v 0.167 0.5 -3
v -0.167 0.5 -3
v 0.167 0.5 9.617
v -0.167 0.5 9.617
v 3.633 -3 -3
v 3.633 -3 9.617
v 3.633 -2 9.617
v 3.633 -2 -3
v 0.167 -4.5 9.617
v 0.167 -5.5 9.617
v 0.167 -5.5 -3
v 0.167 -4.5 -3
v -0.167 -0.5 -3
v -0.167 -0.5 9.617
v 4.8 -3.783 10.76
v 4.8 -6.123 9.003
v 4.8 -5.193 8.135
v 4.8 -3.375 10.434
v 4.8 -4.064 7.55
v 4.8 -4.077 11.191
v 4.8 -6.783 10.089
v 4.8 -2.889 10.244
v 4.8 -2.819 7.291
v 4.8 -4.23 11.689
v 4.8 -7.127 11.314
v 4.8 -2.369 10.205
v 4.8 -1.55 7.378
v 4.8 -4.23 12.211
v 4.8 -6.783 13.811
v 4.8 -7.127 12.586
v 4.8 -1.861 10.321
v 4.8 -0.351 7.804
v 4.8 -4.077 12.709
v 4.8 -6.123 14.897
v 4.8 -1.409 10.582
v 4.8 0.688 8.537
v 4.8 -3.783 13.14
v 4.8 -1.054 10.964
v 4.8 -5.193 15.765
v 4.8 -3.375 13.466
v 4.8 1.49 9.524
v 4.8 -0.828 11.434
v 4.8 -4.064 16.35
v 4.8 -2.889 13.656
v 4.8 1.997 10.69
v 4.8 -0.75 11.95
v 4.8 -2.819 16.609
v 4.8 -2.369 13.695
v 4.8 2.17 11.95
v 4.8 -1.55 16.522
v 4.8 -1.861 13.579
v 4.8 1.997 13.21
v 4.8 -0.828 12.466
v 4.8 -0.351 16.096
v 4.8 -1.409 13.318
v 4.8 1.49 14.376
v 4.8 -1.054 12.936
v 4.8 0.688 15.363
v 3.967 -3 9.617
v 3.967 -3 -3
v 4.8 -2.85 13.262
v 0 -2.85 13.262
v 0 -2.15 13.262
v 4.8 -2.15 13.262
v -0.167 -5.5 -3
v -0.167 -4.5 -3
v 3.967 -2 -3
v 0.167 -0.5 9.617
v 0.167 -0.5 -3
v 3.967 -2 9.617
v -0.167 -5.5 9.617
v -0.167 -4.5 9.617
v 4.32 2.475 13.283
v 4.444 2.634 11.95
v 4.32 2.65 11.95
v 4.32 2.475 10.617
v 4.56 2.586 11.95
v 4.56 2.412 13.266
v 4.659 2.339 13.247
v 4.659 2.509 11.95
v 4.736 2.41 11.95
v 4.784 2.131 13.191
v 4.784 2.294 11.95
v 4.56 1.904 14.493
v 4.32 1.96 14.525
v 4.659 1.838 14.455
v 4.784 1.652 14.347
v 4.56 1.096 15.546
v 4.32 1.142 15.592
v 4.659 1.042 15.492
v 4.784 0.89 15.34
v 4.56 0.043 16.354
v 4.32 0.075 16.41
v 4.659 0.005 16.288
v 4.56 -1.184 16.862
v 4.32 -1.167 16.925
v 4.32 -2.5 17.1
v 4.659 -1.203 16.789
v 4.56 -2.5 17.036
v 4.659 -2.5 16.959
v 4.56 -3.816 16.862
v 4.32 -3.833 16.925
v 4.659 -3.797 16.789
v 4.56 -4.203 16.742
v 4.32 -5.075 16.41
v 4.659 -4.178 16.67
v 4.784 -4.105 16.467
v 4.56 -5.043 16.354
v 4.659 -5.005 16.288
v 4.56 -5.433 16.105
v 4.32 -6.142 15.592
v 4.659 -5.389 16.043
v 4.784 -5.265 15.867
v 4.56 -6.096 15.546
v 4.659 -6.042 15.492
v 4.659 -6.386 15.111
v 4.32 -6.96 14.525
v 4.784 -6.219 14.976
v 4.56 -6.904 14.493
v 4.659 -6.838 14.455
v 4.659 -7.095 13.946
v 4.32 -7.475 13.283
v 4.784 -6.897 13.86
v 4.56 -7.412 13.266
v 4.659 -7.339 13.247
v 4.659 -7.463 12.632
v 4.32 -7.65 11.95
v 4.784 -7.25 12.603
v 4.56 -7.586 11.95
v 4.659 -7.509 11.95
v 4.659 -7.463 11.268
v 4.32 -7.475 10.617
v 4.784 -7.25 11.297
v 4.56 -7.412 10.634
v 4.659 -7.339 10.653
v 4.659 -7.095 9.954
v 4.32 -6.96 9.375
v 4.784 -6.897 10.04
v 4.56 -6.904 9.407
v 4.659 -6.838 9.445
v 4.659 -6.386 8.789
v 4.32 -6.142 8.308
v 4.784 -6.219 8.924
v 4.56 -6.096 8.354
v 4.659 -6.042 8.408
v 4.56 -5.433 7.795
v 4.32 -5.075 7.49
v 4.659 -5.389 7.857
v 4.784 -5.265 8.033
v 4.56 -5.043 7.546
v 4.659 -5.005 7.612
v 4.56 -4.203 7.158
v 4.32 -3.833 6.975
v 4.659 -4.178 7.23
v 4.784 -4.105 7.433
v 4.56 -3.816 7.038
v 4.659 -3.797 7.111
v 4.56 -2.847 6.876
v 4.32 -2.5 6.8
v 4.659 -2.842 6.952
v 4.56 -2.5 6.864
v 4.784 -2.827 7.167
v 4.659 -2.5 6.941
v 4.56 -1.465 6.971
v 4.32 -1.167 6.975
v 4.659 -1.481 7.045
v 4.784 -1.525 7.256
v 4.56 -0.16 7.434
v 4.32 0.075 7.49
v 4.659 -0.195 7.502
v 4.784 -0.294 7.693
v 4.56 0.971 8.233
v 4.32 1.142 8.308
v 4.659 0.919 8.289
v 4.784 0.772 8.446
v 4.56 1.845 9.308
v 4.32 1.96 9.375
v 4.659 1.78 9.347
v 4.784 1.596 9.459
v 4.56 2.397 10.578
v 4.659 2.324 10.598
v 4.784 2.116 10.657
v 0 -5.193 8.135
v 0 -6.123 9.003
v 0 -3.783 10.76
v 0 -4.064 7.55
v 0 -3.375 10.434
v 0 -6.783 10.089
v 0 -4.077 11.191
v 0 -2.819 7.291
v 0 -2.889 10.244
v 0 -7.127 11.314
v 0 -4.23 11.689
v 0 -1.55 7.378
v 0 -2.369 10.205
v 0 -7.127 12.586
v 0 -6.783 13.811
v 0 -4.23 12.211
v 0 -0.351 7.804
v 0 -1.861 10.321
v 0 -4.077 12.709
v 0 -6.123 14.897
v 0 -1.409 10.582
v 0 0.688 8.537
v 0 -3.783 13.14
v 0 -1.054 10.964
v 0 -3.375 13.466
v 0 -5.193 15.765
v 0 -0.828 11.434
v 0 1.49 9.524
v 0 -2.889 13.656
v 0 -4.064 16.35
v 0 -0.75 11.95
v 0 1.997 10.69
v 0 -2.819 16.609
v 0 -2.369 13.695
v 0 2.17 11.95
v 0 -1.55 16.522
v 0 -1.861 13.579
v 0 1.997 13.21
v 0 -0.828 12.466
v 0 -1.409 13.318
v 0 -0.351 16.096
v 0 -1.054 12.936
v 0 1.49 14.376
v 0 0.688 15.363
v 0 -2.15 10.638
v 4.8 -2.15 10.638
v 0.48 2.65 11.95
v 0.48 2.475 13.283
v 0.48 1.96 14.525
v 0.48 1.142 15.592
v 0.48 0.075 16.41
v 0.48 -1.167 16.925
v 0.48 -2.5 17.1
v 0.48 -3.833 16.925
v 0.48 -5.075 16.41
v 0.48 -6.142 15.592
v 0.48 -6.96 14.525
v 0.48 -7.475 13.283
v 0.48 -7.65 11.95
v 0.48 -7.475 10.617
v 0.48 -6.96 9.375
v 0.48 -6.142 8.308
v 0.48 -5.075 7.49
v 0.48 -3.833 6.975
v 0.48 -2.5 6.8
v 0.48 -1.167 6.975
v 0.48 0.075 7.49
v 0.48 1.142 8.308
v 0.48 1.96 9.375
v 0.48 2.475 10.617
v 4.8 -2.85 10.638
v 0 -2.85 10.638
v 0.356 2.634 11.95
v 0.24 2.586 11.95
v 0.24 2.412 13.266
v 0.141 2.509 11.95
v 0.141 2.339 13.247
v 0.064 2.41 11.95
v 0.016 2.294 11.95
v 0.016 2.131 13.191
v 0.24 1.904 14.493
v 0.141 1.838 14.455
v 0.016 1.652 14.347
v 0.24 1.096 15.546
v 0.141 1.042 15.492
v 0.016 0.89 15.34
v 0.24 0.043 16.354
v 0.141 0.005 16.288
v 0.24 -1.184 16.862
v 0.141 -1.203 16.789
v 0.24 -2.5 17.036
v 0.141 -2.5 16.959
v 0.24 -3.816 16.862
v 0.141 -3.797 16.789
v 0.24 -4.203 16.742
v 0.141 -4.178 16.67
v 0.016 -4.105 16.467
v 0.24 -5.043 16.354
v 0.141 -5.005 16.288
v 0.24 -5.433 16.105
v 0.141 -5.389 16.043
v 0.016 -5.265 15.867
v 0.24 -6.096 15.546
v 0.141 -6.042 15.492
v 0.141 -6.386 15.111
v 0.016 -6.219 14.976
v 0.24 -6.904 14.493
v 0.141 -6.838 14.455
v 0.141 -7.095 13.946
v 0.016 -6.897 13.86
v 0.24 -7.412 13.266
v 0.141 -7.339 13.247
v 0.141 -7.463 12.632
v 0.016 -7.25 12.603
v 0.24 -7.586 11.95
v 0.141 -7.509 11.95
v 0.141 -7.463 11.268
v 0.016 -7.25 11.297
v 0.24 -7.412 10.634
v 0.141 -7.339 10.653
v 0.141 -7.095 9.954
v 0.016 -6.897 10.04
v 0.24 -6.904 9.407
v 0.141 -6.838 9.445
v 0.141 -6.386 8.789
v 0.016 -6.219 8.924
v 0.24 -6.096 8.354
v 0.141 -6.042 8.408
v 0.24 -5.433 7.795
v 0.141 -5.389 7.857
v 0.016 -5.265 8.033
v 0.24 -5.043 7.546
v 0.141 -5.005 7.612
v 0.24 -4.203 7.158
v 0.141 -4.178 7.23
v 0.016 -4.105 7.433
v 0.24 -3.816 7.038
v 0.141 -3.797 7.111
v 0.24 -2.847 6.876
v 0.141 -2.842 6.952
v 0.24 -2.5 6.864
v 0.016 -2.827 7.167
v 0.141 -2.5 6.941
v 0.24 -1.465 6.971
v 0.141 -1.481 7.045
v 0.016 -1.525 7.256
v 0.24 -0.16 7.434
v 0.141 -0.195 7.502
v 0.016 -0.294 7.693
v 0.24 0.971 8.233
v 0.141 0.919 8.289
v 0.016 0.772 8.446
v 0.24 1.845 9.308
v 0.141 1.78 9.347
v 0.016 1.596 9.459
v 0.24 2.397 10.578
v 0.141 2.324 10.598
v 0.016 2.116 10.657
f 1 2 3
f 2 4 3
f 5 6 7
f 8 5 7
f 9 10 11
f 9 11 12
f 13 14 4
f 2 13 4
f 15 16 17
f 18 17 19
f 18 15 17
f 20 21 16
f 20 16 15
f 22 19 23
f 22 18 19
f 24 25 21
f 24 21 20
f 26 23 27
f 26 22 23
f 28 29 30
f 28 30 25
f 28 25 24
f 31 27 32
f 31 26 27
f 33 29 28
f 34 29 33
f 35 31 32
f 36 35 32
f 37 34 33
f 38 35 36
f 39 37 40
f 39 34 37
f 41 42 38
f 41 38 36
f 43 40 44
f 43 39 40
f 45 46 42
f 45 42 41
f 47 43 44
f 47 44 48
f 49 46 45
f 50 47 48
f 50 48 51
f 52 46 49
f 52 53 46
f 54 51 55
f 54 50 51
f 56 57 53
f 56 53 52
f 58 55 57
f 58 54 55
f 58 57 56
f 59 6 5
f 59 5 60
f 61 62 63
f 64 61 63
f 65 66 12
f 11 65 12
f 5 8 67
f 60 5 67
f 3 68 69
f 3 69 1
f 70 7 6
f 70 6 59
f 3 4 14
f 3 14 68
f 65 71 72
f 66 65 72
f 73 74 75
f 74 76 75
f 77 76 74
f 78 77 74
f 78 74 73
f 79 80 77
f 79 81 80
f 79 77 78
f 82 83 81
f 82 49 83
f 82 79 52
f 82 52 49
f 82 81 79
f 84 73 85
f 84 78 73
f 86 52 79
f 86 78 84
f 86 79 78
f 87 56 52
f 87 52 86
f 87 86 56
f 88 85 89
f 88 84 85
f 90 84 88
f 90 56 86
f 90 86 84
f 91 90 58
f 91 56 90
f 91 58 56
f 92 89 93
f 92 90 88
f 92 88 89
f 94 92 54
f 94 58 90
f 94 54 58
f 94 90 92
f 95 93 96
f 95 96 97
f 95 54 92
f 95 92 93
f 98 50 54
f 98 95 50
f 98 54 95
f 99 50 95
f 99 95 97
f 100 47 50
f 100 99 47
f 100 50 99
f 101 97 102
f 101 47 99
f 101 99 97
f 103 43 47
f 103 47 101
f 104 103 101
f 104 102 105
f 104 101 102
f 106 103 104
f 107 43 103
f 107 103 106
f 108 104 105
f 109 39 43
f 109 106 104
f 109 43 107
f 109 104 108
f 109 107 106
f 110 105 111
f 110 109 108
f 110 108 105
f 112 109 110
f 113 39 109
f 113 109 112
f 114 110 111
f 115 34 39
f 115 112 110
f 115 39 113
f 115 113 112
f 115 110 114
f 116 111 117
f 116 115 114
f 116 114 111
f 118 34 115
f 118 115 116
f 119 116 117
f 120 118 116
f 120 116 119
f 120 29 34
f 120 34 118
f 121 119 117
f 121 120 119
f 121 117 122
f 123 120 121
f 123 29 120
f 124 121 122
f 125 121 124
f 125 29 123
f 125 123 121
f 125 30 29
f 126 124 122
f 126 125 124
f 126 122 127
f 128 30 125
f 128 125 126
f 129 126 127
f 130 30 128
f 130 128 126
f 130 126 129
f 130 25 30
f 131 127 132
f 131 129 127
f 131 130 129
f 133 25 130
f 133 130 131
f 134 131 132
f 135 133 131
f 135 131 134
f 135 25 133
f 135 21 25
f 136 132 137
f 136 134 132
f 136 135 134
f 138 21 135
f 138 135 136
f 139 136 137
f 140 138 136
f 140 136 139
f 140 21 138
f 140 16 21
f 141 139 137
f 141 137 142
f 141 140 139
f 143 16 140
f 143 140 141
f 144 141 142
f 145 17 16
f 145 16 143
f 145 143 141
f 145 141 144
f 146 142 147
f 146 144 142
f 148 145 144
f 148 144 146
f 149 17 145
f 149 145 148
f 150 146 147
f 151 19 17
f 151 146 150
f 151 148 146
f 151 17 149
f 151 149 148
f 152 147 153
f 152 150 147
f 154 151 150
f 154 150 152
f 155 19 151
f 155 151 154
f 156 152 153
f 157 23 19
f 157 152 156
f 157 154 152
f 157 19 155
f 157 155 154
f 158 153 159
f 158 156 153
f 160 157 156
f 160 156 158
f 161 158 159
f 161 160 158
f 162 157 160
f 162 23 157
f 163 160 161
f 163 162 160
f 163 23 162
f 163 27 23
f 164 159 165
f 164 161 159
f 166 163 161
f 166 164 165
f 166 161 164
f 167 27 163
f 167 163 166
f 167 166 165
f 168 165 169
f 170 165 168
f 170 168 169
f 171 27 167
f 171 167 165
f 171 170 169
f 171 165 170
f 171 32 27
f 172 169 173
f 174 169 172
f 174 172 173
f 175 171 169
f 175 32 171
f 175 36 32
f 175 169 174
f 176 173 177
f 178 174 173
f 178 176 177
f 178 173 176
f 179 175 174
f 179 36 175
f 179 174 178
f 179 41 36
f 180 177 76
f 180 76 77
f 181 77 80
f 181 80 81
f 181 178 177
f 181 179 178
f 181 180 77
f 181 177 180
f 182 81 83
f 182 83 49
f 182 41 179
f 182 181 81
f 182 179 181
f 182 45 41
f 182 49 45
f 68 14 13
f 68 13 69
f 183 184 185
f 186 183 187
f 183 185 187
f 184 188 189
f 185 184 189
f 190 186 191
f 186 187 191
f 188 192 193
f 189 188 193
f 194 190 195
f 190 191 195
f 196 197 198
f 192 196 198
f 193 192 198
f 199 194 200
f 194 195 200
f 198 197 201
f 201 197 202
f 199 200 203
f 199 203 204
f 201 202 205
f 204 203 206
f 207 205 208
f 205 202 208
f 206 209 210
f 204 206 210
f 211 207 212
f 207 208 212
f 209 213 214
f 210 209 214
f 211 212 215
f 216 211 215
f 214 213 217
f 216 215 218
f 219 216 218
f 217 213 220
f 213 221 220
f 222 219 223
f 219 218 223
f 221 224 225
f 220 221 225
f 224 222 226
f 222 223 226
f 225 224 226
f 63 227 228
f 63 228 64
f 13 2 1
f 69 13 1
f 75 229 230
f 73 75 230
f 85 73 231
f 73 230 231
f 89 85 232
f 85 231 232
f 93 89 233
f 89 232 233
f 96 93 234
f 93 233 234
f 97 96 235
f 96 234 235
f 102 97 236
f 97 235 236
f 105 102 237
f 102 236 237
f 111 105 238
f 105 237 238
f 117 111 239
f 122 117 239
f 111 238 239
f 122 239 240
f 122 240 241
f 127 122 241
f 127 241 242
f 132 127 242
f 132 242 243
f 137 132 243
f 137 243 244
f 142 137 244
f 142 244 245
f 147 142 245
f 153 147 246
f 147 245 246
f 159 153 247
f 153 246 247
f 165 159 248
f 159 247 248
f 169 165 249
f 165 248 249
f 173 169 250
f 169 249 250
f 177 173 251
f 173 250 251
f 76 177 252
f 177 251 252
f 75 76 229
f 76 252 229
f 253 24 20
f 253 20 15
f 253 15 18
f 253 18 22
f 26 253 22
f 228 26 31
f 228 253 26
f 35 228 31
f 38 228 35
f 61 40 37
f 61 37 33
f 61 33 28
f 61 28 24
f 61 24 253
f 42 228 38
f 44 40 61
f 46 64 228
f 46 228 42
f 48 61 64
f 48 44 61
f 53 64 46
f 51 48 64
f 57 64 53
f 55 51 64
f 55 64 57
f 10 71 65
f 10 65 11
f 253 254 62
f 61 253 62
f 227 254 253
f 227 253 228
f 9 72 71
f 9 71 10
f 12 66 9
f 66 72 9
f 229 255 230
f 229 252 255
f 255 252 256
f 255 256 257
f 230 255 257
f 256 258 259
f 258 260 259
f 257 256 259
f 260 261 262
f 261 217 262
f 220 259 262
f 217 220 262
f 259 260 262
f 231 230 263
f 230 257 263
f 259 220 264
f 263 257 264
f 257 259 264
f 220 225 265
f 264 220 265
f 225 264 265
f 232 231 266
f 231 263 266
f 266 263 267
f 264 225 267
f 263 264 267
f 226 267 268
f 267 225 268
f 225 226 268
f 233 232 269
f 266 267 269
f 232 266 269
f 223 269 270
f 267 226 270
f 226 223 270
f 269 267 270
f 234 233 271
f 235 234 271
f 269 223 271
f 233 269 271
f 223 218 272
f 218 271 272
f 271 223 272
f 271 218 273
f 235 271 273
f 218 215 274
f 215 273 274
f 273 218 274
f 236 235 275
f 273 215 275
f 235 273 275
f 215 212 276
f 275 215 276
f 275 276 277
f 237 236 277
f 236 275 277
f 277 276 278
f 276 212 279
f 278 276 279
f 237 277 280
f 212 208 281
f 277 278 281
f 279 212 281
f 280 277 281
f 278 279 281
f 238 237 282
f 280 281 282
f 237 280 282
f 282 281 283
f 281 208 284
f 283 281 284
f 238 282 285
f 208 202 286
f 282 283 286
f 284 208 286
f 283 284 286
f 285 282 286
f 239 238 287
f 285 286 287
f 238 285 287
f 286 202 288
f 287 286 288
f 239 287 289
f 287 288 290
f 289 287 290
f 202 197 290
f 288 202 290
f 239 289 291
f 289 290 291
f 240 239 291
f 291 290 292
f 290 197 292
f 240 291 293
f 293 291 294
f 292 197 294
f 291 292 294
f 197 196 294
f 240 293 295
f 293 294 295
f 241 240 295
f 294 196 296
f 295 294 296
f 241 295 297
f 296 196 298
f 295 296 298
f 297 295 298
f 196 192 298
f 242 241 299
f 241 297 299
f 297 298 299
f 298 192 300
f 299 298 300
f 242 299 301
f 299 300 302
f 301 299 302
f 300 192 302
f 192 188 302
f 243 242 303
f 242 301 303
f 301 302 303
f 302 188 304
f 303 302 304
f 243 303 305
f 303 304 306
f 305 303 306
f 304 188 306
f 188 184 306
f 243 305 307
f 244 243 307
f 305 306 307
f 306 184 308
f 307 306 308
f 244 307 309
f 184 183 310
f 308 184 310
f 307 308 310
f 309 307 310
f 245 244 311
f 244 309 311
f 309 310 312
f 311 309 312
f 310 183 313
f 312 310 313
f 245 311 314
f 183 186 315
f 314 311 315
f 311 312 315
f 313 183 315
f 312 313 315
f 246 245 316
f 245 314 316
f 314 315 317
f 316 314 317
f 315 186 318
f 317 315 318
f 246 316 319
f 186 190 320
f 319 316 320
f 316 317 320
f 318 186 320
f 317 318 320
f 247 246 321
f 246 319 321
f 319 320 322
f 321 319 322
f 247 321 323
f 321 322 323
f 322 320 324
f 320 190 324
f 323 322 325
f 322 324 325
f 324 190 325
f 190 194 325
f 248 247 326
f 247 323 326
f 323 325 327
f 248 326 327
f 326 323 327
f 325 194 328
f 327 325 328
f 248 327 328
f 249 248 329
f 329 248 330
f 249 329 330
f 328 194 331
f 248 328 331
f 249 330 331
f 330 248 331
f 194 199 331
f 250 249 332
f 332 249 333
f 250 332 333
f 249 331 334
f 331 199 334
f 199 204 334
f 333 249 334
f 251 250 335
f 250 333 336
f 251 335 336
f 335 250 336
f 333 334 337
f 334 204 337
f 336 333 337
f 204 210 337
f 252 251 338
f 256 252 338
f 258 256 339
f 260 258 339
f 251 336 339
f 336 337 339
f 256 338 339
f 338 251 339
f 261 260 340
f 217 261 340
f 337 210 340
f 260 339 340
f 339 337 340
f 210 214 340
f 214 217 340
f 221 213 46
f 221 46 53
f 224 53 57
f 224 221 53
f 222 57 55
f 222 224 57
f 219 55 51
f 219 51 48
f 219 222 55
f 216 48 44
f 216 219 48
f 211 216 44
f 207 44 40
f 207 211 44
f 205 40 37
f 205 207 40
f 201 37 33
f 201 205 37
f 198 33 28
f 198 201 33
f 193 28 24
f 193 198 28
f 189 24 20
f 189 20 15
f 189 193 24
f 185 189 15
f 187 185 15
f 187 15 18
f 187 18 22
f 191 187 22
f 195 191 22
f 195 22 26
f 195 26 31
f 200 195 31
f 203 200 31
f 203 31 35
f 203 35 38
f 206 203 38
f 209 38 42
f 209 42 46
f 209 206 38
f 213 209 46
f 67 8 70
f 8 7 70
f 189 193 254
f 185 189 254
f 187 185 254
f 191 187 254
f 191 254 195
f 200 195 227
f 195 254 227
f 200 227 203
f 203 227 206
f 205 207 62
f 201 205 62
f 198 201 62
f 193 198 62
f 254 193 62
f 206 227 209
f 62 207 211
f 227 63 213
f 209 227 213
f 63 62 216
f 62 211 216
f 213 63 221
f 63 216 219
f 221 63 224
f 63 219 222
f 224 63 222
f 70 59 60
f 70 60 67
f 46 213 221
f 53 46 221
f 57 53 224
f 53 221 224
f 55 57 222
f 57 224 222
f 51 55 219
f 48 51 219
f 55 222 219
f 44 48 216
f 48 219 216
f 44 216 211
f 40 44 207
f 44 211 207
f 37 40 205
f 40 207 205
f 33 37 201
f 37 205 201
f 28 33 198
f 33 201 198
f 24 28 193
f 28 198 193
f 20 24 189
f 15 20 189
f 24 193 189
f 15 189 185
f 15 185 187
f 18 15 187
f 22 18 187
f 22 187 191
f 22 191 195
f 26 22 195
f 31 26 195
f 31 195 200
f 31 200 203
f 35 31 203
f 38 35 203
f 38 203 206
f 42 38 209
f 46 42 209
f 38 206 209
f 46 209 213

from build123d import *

# Parameters (mm, degrees)
SKETCH001_R       = 1.75
SKETCH001_W       = 0.7
SKETCH001_H       = 2.625
PAD001_DEPTH      = 4.8
SKETCH_R          = 5.15
SKETCH_R_2        = 1.75
PAD_DEPTH         = 4.8
FILLET_R          = 0.48
SKETCH003_W       = 0.333334
SKETCH003_H       = 1
PAD002_DEPTH      = 9.616667
PAD002_DEPTH_BACK = 3


with BuildPart() as pad001:
    # Sketch001 → Pad001 (new body)
    with BuildSketch(Plane.YZ):
        with Locations((-2.5, 11.95)):
            Circle(SKETCH001_R)
        with Locations((-2.5, 11.95)):
            Rectangle(SKETCH001_W, SKETCH001_H, mode=Mode.SUBTRACT)
    extrude(amount=PAD001_DEPTH)


with BuildPart() as fillet_body:
    # Sketch → Pad (new body)
    with BuildSketch(Plane.YZ):
        with Locations((-2.5, 11.95)):
            Circle(SKETCH_R)
        with Locations((-2.5, 11.95)):
            Circle(SKETCH_R_2, mode=Mode.SUBTRACT)
    extrude(amount=PAD_DEPTH)

    # Fillet
    fillet_edges = [fillet_body.edges().sort_by_distance(p)[0] for p in [
        (0, -7.65, 11.95),
        (4.8, -7.65, 11.95),
    ]]
    fillet(fillet_edges, radius=FILLET_R)


with BuildPart() as pad002:
    # Sketch003 → Pad002 (new body, two sides)
    with BuildSketch(Plane.XY) as pad002_sk:
        Rectangle(SKETCH003_W, SKETCH003_H)
        with Locations((3.8, -2.5)):
            Rectangle(SKETCH003_W, SKETCH003_H)
        with Locations((0, -5)):
            Rectangle(SKETCH003_W, SKETCH003_H)
    extrude(amount=PAD002_DEPTH)
    extrude(pad002_sk.sketch, amount=-PAD002_DEPTH_BACK)


solid = Compound([pad001.part, fillet_body.part, pad002.part])
